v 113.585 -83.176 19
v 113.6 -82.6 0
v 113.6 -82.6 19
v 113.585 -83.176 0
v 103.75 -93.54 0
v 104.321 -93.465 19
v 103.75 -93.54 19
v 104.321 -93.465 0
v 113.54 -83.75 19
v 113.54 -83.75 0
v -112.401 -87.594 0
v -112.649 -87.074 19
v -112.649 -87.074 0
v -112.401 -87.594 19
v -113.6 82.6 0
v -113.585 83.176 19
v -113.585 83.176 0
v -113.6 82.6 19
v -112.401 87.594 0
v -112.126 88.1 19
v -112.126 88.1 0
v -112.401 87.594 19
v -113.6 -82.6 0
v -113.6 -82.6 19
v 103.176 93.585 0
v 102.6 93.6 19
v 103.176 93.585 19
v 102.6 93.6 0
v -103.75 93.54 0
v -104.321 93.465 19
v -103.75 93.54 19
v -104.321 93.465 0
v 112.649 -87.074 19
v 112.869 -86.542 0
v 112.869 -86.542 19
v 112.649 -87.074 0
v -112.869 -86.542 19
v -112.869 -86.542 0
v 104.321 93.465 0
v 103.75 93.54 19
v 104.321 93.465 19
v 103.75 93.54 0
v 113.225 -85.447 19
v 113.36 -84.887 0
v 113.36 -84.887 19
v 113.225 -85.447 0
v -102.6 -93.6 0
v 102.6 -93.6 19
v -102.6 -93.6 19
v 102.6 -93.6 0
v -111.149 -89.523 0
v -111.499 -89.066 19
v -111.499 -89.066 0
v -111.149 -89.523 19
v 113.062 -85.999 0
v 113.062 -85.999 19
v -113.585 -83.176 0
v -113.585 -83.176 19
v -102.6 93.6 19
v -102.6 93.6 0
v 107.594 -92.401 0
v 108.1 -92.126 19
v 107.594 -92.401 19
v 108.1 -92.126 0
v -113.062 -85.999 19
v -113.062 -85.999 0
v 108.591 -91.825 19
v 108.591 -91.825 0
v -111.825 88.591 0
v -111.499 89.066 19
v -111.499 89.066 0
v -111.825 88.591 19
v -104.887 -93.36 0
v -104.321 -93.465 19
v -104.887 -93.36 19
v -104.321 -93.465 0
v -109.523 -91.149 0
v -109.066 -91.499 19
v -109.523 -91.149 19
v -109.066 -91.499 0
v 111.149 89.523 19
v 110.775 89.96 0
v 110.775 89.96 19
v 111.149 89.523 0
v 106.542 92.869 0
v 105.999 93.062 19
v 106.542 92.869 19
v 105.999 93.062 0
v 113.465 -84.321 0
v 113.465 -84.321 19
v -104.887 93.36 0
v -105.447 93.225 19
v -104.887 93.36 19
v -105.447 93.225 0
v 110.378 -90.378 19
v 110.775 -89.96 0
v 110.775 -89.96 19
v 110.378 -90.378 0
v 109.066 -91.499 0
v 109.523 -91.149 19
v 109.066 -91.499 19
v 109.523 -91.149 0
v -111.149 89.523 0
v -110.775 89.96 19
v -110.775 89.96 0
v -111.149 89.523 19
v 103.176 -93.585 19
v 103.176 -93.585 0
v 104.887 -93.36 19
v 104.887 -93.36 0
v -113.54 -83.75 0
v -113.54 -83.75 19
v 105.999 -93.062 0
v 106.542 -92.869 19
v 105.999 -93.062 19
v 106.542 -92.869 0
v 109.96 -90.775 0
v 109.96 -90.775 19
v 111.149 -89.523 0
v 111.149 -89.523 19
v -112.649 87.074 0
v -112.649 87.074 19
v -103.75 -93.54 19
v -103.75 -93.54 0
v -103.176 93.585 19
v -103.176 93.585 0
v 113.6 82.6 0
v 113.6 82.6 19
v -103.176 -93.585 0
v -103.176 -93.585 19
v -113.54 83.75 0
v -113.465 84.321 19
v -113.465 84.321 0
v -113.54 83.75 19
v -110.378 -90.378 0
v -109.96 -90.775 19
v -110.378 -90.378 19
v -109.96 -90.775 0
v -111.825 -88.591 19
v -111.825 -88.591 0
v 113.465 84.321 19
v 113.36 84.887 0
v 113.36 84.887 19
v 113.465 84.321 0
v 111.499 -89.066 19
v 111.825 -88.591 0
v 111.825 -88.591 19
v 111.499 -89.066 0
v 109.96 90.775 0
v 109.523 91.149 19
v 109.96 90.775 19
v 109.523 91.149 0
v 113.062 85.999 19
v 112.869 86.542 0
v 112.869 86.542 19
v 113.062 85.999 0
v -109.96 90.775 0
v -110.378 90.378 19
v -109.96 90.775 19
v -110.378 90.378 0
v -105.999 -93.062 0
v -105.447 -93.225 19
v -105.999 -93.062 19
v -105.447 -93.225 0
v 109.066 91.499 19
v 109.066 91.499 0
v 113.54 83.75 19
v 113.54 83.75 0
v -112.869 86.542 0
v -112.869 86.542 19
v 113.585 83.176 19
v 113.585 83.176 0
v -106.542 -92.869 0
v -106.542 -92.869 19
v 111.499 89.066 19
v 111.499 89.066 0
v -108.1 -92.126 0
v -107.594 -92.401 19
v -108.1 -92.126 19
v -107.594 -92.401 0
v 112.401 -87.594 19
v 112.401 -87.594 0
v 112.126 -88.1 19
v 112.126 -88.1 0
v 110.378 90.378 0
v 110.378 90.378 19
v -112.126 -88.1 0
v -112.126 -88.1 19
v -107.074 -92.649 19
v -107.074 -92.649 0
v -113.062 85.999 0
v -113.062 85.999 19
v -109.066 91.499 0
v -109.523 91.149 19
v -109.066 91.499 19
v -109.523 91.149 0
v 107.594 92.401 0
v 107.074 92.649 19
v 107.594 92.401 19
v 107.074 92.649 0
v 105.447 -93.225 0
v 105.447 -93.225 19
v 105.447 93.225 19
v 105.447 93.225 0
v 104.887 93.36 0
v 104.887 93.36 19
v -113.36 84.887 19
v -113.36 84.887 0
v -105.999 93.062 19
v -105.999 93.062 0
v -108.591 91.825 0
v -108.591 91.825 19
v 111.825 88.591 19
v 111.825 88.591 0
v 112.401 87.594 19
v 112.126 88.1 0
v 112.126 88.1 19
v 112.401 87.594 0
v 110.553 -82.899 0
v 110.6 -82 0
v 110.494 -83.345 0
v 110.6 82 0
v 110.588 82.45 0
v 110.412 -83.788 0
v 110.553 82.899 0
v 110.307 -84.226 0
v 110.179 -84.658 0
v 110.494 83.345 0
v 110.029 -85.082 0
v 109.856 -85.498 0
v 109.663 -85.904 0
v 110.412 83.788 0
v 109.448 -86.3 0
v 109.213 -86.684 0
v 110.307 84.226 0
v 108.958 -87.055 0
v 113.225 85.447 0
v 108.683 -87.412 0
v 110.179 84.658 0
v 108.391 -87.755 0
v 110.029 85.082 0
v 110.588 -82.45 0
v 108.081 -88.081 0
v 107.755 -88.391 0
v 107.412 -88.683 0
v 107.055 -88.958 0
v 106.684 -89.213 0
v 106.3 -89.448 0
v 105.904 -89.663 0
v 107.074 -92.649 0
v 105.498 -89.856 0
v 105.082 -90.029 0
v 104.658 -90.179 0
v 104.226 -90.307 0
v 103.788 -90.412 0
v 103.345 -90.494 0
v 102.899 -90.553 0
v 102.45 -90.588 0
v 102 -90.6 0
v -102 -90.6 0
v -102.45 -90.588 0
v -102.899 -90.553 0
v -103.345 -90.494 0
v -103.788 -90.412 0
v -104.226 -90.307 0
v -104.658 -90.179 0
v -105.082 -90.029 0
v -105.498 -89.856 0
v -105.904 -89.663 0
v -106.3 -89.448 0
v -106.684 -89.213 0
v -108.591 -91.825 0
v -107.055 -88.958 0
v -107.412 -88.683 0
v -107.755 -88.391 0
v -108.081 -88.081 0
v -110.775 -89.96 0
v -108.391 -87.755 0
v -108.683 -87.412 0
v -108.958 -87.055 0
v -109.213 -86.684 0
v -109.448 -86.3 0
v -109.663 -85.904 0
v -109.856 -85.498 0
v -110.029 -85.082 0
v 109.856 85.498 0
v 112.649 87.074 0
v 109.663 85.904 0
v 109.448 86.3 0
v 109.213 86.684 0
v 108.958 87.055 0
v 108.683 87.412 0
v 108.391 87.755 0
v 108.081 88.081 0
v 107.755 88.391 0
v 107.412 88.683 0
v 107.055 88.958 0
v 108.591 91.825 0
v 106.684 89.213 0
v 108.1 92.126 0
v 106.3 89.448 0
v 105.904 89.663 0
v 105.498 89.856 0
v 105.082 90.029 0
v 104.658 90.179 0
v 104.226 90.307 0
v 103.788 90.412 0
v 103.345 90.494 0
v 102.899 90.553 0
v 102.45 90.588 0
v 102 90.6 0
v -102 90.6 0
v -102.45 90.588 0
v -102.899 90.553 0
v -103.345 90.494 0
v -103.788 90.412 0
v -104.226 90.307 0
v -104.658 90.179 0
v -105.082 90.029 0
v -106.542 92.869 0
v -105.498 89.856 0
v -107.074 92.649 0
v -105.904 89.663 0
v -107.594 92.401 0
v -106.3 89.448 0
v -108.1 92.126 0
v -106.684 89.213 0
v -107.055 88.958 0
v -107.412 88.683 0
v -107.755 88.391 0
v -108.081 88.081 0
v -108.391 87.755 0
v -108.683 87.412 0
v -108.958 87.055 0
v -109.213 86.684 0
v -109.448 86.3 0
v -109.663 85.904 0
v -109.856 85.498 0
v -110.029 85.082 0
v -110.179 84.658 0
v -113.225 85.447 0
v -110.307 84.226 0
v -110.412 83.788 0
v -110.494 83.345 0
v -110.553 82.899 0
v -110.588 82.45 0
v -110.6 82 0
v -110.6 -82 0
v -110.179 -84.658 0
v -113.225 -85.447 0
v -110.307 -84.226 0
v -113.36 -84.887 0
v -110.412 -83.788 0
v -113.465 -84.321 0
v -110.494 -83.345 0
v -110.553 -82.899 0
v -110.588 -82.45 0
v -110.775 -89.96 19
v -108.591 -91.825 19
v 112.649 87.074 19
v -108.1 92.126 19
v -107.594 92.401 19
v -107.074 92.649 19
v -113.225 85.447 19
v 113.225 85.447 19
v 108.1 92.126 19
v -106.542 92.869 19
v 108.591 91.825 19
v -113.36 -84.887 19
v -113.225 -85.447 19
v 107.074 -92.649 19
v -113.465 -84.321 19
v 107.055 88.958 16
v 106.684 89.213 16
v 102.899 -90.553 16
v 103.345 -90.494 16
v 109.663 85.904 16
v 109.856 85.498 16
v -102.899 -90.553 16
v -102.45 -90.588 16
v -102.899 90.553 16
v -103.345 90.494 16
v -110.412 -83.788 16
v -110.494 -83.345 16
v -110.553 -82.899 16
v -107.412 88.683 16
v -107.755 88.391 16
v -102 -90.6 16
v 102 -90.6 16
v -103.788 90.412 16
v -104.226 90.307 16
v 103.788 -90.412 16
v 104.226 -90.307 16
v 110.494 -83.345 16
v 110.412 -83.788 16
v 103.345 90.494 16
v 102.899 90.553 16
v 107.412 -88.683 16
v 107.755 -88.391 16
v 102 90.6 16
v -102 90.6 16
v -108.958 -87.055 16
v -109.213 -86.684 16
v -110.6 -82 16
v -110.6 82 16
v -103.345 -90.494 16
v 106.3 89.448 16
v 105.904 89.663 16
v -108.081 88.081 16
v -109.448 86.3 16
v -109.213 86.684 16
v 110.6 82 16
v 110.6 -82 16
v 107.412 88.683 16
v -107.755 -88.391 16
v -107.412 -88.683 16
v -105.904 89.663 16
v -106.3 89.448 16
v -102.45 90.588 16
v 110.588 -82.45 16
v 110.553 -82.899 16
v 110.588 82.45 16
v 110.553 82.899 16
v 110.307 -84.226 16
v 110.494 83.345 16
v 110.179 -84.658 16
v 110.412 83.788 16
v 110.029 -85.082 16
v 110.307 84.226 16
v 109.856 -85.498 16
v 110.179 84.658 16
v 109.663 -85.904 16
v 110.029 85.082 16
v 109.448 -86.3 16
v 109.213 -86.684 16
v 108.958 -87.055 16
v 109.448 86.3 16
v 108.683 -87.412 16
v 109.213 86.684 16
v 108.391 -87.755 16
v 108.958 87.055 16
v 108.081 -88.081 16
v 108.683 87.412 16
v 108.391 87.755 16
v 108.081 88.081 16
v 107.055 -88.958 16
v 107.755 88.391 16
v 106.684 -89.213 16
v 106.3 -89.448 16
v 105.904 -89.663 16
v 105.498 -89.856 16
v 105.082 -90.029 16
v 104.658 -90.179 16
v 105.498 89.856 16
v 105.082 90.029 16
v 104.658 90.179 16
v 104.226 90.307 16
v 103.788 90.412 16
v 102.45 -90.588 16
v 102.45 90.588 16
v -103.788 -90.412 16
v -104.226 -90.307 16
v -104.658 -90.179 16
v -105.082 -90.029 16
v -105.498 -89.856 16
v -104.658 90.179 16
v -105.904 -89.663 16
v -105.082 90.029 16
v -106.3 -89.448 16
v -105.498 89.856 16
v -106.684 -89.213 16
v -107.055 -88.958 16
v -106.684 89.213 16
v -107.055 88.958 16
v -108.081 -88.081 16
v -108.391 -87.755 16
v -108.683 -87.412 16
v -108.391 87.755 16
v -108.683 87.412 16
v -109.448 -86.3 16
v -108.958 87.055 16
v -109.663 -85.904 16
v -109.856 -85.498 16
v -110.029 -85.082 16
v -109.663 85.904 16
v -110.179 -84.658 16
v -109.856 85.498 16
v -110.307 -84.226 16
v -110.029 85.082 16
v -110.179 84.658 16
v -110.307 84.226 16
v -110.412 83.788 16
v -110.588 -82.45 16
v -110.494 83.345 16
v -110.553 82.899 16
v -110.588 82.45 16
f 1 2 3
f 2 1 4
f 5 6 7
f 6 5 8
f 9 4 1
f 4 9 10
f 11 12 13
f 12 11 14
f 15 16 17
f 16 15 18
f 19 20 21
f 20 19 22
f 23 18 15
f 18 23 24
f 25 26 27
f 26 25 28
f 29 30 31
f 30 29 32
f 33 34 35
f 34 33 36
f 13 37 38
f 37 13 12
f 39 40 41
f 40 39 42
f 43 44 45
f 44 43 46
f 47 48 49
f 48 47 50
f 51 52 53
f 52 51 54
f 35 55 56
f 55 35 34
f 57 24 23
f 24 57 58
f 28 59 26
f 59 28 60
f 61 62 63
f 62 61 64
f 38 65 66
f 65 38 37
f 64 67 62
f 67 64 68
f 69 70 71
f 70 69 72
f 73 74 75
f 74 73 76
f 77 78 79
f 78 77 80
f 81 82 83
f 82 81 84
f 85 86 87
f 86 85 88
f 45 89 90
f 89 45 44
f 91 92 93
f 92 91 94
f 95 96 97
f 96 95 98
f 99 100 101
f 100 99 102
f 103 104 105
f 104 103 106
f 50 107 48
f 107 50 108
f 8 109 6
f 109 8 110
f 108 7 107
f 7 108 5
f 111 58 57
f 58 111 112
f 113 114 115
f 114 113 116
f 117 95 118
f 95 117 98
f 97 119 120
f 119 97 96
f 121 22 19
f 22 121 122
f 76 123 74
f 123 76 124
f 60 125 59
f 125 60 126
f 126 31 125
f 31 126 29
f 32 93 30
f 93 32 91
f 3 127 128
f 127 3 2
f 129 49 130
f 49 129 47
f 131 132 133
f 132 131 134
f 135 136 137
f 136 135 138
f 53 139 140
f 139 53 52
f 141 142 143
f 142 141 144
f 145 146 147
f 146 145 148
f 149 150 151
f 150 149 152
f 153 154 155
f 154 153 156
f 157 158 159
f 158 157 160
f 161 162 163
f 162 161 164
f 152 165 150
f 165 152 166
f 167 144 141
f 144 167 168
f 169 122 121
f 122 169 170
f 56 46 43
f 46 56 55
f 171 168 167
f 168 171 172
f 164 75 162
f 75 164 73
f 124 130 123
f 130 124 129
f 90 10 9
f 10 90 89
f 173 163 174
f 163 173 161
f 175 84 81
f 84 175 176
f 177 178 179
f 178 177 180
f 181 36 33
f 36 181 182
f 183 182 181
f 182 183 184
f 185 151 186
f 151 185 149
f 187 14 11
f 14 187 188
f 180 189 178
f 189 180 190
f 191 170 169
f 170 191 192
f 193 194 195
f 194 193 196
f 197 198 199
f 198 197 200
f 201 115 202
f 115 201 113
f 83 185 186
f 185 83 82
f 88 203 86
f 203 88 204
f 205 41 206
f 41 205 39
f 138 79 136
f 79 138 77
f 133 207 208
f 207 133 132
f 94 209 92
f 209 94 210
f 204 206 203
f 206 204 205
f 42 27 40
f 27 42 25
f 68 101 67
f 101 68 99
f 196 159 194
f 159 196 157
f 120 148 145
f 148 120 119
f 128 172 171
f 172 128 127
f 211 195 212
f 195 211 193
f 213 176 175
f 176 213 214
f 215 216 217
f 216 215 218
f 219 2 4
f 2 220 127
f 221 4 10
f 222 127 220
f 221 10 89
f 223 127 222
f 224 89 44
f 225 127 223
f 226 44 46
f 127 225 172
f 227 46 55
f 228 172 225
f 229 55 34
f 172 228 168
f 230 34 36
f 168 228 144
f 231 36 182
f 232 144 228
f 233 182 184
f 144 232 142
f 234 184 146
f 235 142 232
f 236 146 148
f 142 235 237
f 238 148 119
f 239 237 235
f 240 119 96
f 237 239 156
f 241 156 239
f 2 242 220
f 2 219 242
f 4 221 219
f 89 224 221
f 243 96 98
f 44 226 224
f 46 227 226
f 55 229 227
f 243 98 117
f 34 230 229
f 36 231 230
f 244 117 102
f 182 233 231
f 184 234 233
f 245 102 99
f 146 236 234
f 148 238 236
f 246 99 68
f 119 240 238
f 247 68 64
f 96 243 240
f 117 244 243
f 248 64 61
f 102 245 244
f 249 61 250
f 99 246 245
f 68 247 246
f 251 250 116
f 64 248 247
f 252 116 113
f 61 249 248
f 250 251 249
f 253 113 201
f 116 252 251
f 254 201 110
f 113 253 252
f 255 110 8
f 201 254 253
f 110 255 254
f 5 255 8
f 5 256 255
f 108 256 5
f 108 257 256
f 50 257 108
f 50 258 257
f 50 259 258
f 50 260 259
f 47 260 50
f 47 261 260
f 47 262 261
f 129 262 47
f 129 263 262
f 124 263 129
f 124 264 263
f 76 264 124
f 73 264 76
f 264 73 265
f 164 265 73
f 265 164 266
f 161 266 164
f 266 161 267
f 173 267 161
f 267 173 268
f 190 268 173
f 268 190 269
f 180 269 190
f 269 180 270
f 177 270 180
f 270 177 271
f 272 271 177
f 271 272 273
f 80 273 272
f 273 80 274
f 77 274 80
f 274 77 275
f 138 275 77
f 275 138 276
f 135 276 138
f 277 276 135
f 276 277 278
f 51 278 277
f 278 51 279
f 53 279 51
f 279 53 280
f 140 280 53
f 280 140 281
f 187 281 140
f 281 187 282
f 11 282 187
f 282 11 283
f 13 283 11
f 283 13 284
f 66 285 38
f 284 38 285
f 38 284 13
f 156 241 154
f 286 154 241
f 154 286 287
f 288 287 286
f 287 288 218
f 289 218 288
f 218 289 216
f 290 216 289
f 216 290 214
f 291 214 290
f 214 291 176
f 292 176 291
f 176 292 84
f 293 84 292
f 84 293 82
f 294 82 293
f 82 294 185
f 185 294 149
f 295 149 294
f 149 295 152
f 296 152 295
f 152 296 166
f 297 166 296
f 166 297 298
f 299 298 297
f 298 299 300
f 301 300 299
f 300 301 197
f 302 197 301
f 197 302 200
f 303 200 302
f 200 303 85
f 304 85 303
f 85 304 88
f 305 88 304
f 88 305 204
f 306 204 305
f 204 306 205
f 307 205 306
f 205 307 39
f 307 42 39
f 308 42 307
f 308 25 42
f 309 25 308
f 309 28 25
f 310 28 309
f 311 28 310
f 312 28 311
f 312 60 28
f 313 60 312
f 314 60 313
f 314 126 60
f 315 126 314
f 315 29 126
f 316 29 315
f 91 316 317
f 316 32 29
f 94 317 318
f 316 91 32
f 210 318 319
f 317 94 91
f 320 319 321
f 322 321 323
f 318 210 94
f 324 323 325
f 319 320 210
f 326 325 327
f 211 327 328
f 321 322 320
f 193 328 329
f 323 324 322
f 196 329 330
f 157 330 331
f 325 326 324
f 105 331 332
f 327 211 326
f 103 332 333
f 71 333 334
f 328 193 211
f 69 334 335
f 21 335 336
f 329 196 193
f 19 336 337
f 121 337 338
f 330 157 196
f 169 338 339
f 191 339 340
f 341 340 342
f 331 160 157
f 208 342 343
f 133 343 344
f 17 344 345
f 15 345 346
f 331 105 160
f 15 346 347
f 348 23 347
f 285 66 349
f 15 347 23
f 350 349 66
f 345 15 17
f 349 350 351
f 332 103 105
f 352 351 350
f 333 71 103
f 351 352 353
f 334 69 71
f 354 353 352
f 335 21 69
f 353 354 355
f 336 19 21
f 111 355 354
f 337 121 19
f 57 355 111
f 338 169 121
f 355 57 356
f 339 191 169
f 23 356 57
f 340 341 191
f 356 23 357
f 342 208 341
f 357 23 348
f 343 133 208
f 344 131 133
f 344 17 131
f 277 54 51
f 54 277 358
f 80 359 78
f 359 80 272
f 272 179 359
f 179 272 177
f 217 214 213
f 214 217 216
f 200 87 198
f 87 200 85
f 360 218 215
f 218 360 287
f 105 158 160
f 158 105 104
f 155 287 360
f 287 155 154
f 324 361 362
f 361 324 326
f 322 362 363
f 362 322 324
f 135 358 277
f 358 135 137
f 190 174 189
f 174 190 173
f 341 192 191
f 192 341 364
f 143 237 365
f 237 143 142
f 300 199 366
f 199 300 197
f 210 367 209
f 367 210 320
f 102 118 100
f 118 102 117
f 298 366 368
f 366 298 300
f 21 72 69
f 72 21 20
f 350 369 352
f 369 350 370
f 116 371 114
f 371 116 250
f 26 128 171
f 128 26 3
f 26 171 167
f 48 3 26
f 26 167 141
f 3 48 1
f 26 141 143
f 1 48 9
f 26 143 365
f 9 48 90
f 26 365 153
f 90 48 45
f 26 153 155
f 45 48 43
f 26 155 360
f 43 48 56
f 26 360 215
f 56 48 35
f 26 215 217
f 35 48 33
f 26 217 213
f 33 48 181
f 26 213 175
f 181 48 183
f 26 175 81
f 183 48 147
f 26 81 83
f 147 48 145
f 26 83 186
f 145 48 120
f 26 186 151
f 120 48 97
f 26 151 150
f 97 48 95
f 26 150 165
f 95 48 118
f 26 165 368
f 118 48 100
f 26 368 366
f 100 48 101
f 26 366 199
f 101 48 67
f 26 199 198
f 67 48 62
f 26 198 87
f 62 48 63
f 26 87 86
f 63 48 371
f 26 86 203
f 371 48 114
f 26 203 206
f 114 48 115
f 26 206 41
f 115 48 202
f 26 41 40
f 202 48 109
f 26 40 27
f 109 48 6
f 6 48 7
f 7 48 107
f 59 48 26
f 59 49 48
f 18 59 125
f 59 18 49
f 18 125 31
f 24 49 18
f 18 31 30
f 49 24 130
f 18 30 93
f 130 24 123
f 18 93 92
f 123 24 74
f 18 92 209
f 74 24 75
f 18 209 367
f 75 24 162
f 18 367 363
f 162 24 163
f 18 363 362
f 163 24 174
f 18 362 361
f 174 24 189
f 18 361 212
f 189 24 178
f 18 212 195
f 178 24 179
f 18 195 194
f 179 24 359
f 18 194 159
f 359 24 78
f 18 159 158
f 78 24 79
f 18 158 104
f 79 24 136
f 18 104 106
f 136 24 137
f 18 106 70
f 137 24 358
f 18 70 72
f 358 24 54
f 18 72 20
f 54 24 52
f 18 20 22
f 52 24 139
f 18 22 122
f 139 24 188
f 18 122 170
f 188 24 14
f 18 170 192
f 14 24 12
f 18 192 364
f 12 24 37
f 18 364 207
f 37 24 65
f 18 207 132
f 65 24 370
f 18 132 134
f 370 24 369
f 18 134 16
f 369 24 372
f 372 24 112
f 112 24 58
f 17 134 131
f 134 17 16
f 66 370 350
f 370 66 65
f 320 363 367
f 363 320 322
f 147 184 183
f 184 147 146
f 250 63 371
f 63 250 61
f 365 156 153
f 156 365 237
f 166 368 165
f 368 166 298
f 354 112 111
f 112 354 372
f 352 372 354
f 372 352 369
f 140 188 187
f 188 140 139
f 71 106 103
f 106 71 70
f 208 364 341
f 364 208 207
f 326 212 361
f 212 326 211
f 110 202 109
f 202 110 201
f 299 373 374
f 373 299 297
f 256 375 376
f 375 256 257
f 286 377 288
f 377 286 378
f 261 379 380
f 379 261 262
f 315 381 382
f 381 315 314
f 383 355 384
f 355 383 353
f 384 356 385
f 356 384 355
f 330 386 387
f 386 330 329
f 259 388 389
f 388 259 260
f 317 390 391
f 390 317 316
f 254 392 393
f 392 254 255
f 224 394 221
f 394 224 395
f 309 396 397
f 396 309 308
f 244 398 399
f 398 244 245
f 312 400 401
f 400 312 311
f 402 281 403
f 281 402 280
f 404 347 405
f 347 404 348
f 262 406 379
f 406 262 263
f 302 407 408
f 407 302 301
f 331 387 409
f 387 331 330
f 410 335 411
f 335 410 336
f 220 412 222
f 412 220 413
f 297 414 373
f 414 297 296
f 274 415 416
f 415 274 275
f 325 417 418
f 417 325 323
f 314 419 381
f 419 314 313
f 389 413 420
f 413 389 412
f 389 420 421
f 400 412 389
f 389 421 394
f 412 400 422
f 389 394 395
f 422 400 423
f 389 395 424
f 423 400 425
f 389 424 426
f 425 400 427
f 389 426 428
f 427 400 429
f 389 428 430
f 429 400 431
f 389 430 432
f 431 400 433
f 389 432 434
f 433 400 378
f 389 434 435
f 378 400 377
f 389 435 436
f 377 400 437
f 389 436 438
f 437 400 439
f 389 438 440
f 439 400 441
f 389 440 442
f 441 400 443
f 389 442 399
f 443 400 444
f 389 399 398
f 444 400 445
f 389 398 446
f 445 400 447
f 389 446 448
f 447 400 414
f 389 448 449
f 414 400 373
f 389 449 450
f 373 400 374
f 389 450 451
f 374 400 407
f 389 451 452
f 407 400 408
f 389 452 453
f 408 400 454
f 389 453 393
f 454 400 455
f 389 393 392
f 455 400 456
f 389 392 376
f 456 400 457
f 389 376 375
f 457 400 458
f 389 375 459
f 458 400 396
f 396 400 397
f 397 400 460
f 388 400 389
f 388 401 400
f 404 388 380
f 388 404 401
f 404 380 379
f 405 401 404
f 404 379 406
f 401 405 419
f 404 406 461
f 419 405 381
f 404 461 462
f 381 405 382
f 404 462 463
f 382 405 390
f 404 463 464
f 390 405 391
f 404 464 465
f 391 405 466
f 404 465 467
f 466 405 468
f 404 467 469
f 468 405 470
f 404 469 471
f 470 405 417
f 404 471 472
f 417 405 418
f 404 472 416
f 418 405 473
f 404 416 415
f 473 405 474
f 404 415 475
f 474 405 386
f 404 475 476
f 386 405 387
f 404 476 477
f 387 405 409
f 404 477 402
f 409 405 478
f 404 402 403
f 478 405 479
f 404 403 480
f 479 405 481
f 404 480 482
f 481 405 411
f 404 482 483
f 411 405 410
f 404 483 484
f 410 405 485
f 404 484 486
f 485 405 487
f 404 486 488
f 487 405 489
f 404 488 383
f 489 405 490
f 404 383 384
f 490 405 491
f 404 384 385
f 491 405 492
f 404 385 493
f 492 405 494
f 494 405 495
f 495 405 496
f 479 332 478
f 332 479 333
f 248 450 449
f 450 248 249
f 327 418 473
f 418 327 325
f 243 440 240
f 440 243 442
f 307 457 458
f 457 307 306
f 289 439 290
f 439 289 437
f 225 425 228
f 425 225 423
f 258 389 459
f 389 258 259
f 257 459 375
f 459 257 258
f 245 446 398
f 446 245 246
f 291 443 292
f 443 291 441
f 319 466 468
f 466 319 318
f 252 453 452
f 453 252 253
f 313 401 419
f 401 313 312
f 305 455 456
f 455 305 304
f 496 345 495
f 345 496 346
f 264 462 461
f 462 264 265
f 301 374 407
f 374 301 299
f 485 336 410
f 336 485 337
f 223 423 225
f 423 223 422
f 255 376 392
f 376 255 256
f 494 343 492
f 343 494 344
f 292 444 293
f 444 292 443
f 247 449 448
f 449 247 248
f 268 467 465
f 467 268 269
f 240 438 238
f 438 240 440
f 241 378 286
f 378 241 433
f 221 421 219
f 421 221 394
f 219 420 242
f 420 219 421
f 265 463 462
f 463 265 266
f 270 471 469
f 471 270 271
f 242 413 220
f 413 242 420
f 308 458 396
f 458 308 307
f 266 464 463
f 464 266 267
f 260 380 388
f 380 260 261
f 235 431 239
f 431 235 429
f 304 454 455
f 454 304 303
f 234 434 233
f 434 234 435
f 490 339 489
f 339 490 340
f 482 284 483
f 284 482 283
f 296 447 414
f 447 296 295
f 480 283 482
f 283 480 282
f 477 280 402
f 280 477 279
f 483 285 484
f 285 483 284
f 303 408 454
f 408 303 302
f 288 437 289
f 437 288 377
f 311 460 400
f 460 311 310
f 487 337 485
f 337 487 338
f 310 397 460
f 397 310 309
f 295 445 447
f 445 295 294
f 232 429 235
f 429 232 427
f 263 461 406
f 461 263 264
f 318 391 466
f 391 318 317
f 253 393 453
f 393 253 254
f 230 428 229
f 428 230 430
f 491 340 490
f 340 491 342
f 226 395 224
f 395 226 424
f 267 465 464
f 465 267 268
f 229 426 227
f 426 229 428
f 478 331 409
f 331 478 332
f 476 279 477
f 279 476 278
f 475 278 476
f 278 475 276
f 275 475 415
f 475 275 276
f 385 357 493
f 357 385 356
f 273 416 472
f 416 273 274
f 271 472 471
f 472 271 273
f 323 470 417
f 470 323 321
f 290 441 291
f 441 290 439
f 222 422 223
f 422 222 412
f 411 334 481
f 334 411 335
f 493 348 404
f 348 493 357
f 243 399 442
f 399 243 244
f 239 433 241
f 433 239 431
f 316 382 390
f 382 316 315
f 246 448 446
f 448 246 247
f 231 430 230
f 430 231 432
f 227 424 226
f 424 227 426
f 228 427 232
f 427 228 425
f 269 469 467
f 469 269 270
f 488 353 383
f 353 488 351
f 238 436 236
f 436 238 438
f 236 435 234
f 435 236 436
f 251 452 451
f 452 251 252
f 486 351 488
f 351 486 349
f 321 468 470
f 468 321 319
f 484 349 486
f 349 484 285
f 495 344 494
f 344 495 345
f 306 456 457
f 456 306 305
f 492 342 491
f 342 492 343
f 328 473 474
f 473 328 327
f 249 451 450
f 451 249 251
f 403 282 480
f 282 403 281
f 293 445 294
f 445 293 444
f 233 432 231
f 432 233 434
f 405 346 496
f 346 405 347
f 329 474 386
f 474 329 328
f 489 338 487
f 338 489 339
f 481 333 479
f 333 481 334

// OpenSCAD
// file: hopper_util.scad
// Shared geometry helpers.
// GPL-3.0-or-later
// Units: mm

// These names are deliberately unprefixed because this project carries no
// library that defines them. A local module silently shadows a library one of
// the same name with no warning at all, so check for collisions before adding
// BOSL2, NopSCADlib or anything else global to this repo.

// This file never sets $fn: it is the consumer's to choose, and it crosses a
// `use <>` boundary as a special variable.

/**
 * Largest corner radius a rounded_square of this size can actually take.
 * offset() silently produces degenerate geometry once the radius exceeds half
 * the short side, so the request is clamped rather than left to misbehave.
 */
function fitted_radius(x, y, radius) = min(radius, min(x, y) / 2 - 0.01);

// Rectangle of x by y centred on the origin, corners rounded to `radius`.
module rounded_square(x, y, radius = 0) {
  assert(x > 0 && y > 0, str("rounded_square: x and y must be > 0, got: ", [x, y]));
  assert(radius >= 0, str("rounded_square: radius must be >= 0, got: ", radius));

  _radius = fitted_radius(x, y, radius);

  if (_radius <= 0) {
    square([x, y], center = true);
  } else {
    // offset out then in leaves the outer corners rounded and the size intact.
    offset(r = _radius) offset(delta = -_radius) square([x, y], center = true);
  }
}

// Extrusion of rounded_square, sitting on z = 0.
module rounded_box(x, y, z, radius = 0) {
  assert(z > 0, str("rounded_box: z must be > 0, got: ", z));

  linear_extrude(height = z) rounded_square(x, y, radius);
}

/**
 * Loft between two 2D sections, the first at z0 and the second at z1.
 *
 * Each section is extruded into a thin slab centred on its z and the two are
 * hulled. The slab has thickness so that adjoining lofts overlap and weld into
 * one solid instead of meeting on a coincident face, which CGAL will not always
 * resolve. Because the hull is taken between the slab EDGES, the resulting
 * taper runs from the bottom of the lower slab to the bottom of the upper one,
 * so z1 - z0 is the true rise of the sloped face.
 *
 * The two slabs are sized independently because a section that is already
 * buried inside an adjoining solid can be given extra thickness to guarantee
 * the weld without disturbing the exposed profile.
 */
module loft(z0, z1, slab0 = 1, slab1 = 1) {
  assert(z1 > z0, str("loft: z1 must be > z0, got: ", [z0, z1]));
  assert(slab0 > 0 && slab1 > 0, str("loft: slabs must be > 0, got: ", [slab0, slab1]));

  hull() {
    translate([0, 0, z0 - slab0 / 2]) linear_extrude(height = slab0) children(0);
    translate([0, 0, z1 - slab1 / 2]) linear_extrude(height = slab1) children(1);
  }
}

// Standalone preview. `use <>` does not run this; `include <>` would.
$fn = $preview ? 48 : 120;
rounded_box(40, 25, 6, 4);
translate([60, 0, 0]) loft(0, 30) {
  circle(d = 12);
  rounded_square(40, 25, 6);
}
// main file
// Lid that slips over the top of the hopper body.
// GPL-3.0-or-later
// Units: mm

use <hopper_util.scad>

/**
 * A plain slip-on lid, sitting on z = 0 at its own rim.
 *
 * It has no seal and no latch, so it keeps debris out but does nothing to keep
 * pellets dry. Tracked in TODO.md.
 */
module hopper_cap(
  top_x,
  top_y,
  funnel_radius = 8,
  clearance = 0.6,
  wall = 3,
  skirt_height = 16,
  top_thickness = 3
) {
  assert(clearance > 0, str("hopper_cap: clearance must be > 0, got: ", clearance));
  assert(wall > 0, str("hopper_cap: wall must be > 0, got: ", wall));
  assert(skirt_height > 0, str("hopper_cap: skirt_height must be > 0, got: ", skirt_height));

  _inner_x = top_x + 2 * clearance;
  _inner_y = top_y + 2 * clearance;

  difference() {
    rounded_box(
      _inner_x + 2 * wall,
      _inner_y + 2 * wall,
      skirt_height + top_thickness,
      funnel_radius + wall
    );

    translate([0, 0, -1])
      rounded_box(_inner_x, _inner_y, skirt_height + 1, funnel_radius + clearance);
  }
}

// Standalone preview.
$fn = $preview ? 48 : 120;
hopper_cap(top_x = 220, top_y = 180);
